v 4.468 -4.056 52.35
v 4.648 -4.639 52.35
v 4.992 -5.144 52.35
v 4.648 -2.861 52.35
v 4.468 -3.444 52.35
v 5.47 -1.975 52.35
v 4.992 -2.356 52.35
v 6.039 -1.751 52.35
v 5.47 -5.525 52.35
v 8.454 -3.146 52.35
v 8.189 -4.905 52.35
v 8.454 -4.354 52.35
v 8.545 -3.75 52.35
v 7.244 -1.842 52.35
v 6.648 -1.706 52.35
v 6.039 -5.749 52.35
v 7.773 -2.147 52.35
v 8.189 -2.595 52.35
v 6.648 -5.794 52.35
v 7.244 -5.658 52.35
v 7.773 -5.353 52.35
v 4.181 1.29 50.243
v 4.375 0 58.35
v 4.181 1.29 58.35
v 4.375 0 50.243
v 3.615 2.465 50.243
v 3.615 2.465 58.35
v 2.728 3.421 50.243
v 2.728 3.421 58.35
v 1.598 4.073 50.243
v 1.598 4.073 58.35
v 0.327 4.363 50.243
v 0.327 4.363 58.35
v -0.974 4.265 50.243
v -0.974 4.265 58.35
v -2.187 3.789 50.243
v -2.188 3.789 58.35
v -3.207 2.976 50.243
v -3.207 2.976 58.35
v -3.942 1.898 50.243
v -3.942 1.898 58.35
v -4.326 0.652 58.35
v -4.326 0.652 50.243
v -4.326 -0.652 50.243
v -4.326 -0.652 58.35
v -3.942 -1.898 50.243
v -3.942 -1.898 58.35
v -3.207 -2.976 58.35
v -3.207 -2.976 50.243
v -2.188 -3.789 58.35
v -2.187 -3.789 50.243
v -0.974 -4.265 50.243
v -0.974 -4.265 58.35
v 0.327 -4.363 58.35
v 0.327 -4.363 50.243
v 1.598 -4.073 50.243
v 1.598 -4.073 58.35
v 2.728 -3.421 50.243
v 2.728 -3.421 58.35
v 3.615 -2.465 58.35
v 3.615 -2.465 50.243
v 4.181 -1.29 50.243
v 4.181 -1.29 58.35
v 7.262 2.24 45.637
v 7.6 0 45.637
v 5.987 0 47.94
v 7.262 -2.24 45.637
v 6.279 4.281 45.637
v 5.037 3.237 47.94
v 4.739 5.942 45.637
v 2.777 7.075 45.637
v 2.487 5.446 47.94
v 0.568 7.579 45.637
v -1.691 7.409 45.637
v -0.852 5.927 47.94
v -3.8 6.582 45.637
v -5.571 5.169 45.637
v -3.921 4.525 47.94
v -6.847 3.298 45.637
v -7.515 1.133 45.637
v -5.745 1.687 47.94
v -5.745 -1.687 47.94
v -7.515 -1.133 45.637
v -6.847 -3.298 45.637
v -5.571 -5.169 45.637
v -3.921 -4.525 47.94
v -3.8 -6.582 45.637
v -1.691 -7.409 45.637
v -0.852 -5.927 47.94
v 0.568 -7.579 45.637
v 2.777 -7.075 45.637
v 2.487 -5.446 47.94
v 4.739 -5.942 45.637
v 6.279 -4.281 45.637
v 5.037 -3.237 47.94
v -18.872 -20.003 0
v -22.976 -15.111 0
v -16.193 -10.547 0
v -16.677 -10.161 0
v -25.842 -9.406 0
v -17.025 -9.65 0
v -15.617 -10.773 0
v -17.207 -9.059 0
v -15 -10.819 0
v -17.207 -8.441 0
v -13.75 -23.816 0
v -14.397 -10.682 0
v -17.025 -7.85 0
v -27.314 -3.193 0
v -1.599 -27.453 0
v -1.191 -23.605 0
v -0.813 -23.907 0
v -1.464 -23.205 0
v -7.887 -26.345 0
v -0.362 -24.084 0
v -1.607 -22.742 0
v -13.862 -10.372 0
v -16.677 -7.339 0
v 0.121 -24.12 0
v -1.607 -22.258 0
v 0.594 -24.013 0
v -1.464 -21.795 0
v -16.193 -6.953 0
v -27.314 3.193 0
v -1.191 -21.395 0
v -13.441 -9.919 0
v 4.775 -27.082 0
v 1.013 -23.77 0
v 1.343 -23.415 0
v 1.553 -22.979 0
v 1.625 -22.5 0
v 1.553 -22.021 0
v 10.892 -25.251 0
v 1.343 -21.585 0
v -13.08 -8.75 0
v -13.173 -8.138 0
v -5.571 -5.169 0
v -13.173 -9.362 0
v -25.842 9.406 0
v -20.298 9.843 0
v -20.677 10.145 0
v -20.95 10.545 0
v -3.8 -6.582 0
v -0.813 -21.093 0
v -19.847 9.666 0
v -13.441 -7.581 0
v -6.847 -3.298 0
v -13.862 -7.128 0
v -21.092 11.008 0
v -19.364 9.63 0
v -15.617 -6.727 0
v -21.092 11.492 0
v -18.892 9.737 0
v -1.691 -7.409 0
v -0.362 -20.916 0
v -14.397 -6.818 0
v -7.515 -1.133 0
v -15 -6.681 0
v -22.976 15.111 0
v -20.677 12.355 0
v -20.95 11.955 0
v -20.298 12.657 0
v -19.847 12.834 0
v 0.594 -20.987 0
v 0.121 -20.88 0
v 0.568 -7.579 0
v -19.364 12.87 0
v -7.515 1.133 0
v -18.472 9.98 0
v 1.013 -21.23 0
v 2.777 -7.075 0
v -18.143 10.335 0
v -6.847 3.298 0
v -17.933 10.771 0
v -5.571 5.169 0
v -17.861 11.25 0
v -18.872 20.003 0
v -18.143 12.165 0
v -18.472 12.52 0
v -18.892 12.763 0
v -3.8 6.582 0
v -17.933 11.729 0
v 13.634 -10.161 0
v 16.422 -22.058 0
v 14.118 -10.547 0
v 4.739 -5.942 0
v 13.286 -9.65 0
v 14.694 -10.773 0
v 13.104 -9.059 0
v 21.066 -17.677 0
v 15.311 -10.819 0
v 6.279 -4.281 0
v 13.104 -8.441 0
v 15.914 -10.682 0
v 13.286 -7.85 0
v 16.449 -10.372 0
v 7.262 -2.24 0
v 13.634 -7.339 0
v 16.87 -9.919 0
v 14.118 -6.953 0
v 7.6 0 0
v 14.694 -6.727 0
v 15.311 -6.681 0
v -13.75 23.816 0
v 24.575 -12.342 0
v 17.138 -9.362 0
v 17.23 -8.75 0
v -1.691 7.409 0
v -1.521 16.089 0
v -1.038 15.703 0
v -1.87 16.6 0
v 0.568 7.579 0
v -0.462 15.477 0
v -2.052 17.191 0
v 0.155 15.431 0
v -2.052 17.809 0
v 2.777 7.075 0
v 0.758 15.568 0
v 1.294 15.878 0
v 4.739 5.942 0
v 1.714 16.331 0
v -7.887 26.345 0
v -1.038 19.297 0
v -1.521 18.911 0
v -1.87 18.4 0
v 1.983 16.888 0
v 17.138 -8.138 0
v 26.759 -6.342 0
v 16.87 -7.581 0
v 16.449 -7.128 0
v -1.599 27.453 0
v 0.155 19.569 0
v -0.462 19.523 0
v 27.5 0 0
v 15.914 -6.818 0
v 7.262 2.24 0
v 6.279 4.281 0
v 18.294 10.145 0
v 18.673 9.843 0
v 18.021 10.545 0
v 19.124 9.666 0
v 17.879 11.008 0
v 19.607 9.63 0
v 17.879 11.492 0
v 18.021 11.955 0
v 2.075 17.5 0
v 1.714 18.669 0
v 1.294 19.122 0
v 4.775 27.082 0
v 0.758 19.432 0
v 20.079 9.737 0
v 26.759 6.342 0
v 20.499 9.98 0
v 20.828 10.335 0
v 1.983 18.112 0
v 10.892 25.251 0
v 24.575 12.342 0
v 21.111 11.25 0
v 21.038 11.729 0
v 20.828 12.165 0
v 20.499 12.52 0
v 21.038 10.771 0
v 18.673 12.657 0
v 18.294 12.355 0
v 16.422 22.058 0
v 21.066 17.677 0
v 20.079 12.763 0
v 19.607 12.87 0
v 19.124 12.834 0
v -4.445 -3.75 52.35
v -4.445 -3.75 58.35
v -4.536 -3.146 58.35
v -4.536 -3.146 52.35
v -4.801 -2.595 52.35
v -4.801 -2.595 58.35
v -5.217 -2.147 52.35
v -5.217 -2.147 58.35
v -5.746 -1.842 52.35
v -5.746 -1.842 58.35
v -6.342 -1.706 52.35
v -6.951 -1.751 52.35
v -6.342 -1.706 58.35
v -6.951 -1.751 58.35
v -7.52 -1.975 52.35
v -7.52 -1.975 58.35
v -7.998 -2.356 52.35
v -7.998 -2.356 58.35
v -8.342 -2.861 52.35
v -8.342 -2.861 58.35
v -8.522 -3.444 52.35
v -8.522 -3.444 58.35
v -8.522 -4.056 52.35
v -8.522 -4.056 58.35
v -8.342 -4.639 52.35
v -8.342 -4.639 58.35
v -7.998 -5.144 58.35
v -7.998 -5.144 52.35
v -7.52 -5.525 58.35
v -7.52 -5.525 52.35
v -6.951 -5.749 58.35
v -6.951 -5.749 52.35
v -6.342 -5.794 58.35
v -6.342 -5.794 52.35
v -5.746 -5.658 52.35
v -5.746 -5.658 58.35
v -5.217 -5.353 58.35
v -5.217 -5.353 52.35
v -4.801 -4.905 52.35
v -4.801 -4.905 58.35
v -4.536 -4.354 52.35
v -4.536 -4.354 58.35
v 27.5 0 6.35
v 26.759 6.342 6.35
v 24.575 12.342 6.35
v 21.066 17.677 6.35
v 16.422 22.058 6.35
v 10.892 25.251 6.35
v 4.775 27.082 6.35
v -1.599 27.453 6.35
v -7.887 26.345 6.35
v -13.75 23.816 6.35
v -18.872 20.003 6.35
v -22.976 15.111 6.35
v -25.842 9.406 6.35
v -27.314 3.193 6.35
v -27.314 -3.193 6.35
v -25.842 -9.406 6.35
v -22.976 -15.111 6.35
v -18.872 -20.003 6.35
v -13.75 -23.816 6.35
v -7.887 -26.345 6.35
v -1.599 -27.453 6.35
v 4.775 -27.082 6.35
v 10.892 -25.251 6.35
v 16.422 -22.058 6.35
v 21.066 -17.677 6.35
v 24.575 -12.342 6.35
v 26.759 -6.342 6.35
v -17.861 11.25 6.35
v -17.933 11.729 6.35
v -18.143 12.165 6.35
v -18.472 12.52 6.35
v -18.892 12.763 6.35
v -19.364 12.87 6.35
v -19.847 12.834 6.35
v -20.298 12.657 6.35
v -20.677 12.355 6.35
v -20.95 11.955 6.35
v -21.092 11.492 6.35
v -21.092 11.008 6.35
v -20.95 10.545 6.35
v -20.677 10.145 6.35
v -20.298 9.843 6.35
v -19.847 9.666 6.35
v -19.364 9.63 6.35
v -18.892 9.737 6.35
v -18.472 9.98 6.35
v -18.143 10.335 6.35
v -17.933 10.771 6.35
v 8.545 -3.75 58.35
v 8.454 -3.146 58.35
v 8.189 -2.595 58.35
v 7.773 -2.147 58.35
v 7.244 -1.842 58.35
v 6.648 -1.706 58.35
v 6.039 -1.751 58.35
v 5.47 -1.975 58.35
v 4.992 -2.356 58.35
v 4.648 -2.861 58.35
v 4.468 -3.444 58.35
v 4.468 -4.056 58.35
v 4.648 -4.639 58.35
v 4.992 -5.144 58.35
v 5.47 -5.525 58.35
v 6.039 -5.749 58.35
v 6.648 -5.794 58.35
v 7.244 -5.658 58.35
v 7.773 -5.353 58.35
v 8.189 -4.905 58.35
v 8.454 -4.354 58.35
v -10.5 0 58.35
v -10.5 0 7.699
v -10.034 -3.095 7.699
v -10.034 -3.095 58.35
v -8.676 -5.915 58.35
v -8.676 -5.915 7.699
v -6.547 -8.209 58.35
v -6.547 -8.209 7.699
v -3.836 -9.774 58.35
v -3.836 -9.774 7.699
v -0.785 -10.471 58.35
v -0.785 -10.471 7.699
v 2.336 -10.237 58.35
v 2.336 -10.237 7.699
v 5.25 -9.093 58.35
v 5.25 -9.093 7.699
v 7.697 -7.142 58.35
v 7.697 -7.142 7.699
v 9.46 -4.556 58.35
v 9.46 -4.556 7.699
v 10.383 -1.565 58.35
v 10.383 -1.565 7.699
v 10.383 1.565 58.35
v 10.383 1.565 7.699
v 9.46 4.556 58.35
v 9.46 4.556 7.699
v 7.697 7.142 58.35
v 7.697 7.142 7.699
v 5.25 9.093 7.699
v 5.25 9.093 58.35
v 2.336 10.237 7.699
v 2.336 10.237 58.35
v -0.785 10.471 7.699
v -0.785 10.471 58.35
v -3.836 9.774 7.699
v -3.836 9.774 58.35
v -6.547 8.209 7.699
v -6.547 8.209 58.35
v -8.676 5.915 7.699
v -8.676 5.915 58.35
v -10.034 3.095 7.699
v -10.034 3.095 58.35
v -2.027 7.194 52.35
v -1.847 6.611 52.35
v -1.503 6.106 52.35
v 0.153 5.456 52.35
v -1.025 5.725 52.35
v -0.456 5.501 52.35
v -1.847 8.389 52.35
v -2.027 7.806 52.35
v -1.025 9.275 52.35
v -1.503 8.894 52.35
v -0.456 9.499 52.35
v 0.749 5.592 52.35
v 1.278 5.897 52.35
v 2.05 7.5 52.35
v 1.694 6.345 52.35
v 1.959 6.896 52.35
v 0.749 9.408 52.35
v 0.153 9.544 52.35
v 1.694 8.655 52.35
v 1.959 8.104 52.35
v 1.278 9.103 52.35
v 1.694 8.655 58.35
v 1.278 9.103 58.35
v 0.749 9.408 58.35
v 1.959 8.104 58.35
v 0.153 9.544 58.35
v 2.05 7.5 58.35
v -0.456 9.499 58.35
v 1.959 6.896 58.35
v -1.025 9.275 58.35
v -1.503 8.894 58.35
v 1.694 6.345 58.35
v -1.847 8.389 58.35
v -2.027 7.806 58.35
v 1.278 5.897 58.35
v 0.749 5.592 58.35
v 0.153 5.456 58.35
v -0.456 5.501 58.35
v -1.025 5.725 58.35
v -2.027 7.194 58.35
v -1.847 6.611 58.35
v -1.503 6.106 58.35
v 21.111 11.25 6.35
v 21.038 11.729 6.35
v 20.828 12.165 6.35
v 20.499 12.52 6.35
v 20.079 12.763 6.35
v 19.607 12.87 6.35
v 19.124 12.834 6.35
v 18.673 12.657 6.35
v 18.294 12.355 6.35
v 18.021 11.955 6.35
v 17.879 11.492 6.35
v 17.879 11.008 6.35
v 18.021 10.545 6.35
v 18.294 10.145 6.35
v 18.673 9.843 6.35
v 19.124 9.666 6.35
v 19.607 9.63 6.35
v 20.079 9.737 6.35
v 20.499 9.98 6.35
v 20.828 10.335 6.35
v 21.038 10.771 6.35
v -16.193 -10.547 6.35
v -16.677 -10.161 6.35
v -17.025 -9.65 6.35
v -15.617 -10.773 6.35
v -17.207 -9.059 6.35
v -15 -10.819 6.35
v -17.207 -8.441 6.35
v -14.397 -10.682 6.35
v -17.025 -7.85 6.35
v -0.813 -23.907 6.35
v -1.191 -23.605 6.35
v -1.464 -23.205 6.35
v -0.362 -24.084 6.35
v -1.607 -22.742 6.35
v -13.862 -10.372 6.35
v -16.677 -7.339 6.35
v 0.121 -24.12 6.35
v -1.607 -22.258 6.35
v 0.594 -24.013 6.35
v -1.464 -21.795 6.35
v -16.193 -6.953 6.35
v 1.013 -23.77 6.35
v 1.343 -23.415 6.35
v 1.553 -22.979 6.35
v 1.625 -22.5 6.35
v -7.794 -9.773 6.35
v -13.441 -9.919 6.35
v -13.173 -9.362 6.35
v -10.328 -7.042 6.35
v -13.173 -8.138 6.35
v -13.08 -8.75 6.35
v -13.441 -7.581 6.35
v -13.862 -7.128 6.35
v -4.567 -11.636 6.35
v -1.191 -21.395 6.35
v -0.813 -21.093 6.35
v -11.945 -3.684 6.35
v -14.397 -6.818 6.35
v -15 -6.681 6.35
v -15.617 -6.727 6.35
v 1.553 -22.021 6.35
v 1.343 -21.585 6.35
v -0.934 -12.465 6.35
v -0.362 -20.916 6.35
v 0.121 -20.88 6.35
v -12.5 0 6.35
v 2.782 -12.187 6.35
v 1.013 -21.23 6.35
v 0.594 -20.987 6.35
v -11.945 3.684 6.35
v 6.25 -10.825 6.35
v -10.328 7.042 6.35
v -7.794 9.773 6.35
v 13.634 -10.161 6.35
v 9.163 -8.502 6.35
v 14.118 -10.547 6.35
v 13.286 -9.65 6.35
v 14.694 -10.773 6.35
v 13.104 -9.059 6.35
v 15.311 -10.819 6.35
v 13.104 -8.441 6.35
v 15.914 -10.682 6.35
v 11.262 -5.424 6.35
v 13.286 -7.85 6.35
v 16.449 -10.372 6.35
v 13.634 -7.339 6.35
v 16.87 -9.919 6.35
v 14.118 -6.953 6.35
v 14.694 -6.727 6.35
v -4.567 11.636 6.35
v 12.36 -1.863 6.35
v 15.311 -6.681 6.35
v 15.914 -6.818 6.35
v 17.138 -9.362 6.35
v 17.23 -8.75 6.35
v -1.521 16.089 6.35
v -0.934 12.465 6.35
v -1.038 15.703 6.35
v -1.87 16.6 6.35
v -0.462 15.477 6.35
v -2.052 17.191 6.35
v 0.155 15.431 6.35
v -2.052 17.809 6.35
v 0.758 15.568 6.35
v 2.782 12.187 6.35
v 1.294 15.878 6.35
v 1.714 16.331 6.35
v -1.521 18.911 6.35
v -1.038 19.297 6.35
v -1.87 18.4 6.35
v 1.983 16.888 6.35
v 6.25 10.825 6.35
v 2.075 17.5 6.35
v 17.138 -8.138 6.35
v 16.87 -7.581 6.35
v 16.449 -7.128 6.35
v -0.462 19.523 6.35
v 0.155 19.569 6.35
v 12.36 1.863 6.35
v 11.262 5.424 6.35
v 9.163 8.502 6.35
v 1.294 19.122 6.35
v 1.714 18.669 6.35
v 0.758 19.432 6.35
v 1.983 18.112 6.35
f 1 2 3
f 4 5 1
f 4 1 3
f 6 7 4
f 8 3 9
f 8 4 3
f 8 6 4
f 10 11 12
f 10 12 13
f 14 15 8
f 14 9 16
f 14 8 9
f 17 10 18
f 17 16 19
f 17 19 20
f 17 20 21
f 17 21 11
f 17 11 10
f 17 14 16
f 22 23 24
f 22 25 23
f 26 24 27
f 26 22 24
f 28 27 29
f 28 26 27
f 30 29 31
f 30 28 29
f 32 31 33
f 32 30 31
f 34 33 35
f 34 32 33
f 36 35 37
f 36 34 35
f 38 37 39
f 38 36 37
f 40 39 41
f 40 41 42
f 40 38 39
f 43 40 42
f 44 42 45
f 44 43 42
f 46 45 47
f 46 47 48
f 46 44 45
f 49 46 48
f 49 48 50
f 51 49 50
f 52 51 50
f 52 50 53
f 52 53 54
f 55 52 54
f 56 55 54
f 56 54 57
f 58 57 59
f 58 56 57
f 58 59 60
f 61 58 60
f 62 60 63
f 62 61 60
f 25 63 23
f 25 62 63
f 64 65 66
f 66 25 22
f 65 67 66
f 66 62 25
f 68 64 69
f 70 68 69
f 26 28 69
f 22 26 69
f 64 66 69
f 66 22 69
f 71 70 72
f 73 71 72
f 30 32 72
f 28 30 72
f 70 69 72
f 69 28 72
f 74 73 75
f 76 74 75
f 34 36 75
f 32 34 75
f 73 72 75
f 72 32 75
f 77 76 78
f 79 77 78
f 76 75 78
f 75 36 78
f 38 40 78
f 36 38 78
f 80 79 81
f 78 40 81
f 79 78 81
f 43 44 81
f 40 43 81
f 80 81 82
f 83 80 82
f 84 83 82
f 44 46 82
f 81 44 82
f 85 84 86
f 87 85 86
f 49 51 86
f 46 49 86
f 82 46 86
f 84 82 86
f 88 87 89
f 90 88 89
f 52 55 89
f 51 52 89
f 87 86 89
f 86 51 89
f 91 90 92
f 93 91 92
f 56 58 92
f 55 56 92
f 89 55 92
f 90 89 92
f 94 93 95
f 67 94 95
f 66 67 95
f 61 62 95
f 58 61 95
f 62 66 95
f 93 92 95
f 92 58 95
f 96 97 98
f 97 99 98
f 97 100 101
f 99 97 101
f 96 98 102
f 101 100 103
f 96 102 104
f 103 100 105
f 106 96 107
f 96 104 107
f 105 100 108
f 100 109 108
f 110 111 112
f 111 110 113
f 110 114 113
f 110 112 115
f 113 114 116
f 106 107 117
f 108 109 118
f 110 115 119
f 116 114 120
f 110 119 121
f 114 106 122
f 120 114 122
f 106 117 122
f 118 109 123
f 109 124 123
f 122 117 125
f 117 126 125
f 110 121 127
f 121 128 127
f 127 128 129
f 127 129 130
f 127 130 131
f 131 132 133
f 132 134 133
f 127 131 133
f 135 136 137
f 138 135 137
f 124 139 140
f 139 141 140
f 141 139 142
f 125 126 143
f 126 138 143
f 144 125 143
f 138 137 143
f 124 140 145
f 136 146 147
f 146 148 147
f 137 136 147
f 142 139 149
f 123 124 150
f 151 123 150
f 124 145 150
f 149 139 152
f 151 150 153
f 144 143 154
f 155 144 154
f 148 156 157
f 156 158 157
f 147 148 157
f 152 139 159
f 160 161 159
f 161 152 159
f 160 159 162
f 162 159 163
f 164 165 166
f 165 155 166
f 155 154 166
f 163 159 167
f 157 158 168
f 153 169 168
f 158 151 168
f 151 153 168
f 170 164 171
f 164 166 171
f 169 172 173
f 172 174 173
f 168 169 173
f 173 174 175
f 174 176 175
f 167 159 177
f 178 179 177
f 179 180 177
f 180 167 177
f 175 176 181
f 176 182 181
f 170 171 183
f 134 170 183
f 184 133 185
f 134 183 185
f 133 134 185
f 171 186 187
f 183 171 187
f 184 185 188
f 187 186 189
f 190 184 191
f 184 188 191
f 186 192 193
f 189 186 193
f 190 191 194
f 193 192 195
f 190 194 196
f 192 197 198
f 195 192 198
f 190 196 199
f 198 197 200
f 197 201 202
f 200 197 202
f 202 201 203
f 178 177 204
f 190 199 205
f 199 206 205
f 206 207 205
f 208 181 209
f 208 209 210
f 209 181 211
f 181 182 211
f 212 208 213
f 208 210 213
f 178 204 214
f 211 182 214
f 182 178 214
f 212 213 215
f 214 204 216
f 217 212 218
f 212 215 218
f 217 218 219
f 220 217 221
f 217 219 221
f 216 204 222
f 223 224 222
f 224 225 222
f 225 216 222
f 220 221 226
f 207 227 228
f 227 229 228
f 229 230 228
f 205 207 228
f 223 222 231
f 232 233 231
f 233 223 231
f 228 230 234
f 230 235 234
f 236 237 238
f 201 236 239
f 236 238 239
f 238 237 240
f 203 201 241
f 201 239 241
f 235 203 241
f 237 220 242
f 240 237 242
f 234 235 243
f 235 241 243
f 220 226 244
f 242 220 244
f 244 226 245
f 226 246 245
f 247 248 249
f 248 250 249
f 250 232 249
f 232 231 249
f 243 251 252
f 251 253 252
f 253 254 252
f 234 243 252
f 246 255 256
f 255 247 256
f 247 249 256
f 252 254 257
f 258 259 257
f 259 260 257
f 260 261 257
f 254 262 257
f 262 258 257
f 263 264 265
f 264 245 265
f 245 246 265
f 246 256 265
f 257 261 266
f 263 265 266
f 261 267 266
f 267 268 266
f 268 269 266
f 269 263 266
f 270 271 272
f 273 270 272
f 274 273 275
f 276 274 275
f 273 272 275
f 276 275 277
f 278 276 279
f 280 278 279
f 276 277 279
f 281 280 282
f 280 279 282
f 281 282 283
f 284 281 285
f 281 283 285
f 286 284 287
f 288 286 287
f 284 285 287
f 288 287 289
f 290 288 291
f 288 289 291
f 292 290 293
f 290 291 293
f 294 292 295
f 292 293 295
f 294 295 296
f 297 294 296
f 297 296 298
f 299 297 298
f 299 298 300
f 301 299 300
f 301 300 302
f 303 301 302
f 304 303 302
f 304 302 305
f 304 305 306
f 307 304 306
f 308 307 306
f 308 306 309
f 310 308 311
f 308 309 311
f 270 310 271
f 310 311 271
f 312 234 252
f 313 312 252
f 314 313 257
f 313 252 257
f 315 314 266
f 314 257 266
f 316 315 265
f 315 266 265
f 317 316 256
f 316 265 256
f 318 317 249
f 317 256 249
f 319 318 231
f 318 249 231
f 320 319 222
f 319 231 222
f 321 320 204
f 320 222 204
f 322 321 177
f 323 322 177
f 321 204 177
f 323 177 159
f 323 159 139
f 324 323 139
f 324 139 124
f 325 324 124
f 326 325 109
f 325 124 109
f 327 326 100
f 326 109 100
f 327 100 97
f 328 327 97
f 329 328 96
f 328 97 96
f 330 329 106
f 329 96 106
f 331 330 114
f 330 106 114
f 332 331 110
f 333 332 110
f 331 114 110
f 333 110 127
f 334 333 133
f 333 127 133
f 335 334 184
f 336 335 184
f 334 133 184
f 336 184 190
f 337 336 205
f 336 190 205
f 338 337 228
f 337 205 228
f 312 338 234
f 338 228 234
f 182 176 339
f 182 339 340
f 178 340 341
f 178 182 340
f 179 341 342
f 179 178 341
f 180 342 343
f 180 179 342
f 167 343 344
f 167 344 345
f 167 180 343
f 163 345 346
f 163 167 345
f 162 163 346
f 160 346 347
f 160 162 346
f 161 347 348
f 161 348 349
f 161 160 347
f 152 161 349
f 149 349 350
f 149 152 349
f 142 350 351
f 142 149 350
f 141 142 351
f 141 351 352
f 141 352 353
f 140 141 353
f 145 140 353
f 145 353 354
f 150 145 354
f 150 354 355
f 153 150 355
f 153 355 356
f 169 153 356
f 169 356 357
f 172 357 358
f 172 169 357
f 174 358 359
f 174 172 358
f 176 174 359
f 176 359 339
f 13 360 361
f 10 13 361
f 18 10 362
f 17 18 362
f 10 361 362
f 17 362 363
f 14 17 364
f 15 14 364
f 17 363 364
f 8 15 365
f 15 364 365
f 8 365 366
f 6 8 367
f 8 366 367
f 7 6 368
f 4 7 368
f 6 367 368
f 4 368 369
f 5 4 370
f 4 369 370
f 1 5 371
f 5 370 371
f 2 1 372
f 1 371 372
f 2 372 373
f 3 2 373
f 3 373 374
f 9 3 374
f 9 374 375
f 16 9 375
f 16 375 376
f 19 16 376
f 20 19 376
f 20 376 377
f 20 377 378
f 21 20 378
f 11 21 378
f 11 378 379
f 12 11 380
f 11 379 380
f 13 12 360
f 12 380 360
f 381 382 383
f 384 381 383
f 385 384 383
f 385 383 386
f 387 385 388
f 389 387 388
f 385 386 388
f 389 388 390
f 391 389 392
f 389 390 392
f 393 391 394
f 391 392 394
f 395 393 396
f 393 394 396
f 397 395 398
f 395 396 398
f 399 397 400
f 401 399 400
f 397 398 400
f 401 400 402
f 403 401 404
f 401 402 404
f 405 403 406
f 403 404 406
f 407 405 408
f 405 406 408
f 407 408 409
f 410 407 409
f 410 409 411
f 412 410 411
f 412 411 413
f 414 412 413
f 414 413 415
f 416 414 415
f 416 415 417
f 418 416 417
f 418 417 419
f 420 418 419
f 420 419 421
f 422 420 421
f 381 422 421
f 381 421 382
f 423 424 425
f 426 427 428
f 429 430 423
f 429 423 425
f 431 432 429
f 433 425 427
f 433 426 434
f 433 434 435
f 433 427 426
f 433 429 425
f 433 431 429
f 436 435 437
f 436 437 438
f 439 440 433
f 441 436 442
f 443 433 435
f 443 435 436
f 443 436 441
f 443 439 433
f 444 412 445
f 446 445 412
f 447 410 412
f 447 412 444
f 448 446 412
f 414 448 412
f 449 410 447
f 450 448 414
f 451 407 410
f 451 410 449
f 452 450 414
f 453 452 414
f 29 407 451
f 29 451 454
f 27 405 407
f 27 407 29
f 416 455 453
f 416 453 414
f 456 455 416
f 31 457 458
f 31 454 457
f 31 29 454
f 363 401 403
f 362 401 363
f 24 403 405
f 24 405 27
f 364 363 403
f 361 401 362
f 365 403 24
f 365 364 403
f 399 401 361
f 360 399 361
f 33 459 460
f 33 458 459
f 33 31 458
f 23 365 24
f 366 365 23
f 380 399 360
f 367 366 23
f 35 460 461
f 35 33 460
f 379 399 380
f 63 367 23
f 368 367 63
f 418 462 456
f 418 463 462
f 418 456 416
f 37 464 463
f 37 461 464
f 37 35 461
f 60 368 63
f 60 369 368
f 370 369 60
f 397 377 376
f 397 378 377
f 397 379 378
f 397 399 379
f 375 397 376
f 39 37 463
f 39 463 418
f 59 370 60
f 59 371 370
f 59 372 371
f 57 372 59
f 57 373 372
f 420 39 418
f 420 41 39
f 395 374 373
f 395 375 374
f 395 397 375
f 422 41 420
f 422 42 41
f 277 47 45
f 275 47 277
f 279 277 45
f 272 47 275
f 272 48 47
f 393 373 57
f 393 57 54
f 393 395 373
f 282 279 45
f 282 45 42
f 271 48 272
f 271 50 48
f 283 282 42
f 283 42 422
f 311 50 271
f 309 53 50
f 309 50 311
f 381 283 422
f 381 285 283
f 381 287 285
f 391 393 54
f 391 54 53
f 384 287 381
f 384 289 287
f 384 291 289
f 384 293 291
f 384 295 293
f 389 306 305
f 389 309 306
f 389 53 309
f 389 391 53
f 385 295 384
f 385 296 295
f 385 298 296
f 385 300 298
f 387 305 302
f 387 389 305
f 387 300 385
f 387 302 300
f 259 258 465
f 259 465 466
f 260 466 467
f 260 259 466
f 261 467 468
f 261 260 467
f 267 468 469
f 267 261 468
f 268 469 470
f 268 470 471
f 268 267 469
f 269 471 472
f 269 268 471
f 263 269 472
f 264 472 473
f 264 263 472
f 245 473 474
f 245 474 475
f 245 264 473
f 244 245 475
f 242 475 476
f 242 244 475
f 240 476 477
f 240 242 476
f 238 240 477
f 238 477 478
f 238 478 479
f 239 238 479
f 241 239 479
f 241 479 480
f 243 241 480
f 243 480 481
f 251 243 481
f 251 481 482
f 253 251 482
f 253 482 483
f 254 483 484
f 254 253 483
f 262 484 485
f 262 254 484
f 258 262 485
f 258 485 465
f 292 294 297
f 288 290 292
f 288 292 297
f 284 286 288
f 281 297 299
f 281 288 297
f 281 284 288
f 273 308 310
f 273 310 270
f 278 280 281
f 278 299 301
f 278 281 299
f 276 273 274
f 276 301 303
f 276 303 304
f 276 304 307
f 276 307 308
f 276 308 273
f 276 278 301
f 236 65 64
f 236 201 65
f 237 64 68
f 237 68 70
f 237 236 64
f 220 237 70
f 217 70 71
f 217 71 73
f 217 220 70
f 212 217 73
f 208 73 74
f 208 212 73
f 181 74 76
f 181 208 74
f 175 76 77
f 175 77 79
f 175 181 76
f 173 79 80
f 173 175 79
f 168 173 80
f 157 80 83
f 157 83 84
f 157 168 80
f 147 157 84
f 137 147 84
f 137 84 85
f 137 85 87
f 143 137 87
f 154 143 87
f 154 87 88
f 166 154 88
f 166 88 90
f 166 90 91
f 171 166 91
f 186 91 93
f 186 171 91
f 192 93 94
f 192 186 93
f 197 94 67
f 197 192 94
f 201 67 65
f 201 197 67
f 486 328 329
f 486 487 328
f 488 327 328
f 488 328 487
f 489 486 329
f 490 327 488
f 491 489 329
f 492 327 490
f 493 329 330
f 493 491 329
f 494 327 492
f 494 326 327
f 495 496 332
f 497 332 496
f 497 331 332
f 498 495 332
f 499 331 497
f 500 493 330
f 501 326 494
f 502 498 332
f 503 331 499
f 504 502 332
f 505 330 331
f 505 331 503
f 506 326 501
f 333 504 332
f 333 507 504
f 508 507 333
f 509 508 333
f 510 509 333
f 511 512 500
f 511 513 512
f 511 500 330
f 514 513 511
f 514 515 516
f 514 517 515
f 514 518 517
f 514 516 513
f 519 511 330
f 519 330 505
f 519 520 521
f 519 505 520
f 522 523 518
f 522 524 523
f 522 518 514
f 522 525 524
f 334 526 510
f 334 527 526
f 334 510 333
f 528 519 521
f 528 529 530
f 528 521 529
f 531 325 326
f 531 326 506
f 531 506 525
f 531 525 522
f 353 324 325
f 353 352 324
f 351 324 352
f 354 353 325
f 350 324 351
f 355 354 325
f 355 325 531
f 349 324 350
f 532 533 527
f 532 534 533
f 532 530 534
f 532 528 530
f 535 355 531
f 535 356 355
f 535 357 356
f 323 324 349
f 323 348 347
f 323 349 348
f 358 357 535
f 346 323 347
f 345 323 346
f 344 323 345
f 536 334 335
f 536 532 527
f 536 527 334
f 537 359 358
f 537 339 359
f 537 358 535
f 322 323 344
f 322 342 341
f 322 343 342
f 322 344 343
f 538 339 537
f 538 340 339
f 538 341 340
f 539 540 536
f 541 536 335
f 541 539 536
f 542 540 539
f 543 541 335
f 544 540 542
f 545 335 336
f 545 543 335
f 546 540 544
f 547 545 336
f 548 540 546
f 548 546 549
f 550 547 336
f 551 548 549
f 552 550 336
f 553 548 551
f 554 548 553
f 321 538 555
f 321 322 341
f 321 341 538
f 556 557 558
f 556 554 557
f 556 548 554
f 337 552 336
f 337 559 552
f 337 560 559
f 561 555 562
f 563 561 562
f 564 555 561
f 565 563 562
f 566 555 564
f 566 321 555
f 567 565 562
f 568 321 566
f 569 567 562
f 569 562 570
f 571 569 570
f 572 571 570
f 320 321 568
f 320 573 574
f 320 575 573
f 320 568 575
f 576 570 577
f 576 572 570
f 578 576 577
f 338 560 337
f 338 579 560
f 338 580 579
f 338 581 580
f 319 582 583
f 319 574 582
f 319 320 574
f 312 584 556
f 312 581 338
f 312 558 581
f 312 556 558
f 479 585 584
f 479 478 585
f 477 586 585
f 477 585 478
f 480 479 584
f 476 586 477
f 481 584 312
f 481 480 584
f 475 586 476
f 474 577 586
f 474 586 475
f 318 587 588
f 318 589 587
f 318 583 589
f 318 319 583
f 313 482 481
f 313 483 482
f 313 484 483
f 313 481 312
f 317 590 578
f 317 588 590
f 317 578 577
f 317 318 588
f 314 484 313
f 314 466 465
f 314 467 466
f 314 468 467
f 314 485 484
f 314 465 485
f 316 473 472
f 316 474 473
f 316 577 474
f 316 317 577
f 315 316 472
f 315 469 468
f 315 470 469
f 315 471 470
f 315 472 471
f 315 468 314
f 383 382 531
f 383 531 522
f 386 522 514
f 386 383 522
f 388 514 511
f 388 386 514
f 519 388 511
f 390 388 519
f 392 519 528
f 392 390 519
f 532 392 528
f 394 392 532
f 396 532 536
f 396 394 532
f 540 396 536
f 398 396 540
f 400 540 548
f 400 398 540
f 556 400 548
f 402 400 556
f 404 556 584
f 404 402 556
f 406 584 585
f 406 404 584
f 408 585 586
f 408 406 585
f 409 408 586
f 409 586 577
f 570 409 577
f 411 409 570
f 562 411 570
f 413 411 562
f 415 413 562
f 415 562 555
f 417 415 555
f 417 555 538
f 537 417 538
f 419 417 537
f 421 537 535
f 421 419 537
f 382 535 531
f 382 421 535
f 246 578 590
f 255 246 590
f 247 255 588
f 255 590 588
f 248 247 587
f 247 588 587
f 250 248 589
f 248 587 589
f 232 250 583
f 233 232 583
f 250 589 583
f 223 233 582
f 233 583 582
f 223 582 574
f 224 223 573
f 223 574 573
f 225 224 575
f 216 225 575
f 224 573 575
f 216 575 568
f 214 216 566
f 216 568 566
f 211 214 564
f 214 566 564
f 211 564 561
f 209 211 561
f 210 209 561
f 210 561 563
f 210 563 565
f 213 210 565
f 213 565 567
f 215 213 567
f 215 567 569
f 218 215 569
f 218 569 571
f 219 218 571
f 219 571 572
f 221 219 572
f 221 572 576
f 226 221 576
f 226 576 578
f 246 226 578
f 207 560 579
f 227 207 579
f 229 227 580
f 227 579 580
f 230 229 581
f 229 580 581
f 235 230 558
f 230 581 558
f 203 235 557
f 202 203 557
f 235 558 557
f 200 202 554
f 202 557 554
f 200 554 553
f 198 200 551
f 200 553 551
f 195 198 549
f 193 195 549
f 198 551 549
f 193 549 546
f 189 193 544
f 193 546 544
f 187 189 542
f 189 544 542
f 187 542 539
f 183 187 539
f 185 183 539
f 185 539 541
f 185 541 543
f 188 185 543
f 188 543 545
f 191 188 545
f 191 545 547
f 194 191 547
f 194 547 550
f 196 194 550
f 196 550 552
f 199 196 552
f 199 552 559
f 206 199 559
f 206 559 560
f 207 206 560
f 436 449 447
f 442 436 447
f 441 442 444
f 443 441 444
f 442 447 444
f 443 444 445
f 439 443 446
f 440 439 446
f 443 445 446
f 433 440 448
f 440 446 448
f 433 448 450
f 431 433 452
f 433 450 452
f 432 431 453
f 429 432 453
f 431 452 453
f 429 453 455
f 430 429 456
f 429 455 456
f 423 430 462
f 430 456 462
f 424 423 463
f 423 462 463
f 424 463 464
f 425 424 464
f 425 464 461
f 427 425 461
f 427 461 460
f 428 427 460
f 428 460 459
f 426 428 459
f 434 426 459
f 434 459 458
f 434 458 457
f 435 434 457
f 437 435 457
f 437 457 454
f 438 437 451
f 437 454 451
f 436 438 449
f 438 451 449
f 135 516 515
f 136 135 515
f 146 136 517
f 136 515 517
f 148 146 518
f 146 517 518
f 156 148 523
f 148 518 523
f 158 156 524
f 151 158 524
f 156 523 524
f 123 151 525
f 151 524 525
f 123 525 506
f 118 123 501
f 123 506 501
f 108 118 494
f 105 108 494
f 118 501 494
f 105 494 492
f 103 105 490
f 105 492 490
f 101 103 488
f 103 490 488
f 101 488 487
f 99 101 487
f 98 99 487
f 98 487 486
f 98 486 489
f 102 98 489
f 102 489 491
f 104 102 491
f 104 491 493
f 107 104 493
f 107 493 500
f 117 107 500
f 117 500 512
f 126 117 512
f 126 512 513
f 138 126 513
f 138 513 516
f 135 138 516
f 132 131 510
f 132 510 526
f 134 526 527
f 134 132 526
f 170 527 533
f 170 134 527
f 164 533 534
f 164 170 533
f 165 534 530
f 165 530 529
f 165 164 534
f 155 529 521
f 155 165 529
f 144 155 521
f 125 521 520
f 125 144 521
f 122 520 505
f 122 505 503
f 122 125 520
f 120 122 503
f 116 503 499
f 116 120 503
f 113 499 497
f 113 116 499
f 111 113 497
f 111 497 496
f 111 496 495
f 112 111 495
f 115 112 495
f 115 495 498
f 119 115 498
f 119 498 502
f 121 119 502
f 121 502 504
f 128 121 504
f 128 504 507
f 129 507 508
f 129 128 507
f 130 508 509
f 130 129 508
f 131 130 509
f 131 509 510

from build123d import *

# Parameters (mm, degrees)
ESQUISSE3_R         = 27.5
ESQUISSE3_R_2       = 1.625
ESQUISSE3_R_3       = 7.6
BOSS_EXTRU_1_DEPTH  = 6.35
ESQUISSE4_R         = 10.5
ESQUISSE4_R_2       = 7.6
BOSS_EXTRU_2_DEPTH  = 45
SKETCH1_R           = 10.5
SKETCH1_R_2         = 4.375
BOSS_EXTRUDE1_DEPTH = 7
SKETCH2_R           = 2.05
CUT_EXTRUDE1_DEPTH  = 6
CHAMFER2_SIZE       = 5.712592027
CHAMFER2_SIZE_2     = 4
CHAMFER3_SIZE       = 2
CHAMFER3_SIZE2      = 1.349017034
SKETCH3_R           = 2.075
CUT_EXTRUDE2_DEPTH  = 8


with BuildPart() as part:
    # Esquisse3 → Boss.-Extru.1 (new body)
    with BuildSketch(Plane.XY):
        Circle(ESQUISSE3_R)
        with Locations((-19.485571585, 11.25)):
            Circle(ESQUISSE3_R_2, mode=Mode.SUBTRACT)
        with Locations((19.485571585, 11.25)):
            Circle(ESQUISSE3_R_2, mode=Mode.SUBTRACT)
        with Locations((0, -22.5)):
            Circle(ESQUISSE3_R_2, mode=Mode.SUBTRACT)
        Circle(ESQUISSE3_R_3, mode=Mode.SUBTRACT)
    extrude(amount=BOSS_EXTRU_1_DEPTH)

    # Esquisse4 → Boss.-Extru.2 (add)
    with BuildSketch(Plane.XY.offset(6.35)):
        with Locations(Location((0, 0, 0), (0, 0, 180))):
            Circle(ESQUISSE4_R)
        Circle(ESQUISSE4_R_2, mode=Mode.SUBTRACT)
    extrude(amount=BOSS_EXTRU_2_DEPTH)

    # Sketch1 → Boss-Extrude1 (add)
    with BuildSketch(Plane.XY.offset(51.35)):
        with Locations(Location((0, 0, 0), (0, 0, 180))):
            Circle(SKETCH1_R)
        Circle(SKETCH1_R_2, mode=Mode.SUBTRACT)
    extrude(amount=BOSS_EXTRUDE1_DEPTH)

    # Sketch2 → Cut-Extrude1 (cut)
    with BuildSketch(Plane.XY.offset(58.35)):
        with Locations((0, 7.5)):
            Circle(SKETCH2_R)
        with Locations((-6.495190528, -3.75)):
            Circle(SKETCH2_R)
        with Locations((6.495190528, -3.75)):
            Circle(SKETCH2_R)
    extrude(amount=-CUT_EXTRUDE1_DEPTH, mode=Mode.SUBTRACT)

    # Chamfer2
    # the kernel refuses this chamfer: 5.712592027, 4 mm, written as the material it adds along each edge
    with BuildSketch(Plane(origin=(0, 0, 51.35), x_dir=(1, 0, 0), z_dir=(0, -1, 0))) as chamfer2_piece_1_section:
        Polygon((7.6, -CHAMFER2_SIZE), (7.6 - CHAMFER2_SIZE_2, 0), (7.6, 0), align=None)
    chamfer2_piece_1 = revolve(axis=Axis((0, 0, 51.35), (0, 0, 1)), mode=Mode.PRIVATE)
    chamfer2_piece_1 = chamfer2_piece_1 - Plane(origin=(0, 0, 47.891956694), x_dir=(1, 0, 0), z_dir=(0, 0, -1)) * Cylinder(4.375, 31, mode=Mode.PRIVATE)
    add(chamfer2_piece_1)

    # Chamfer3
    chamfer3_edges = [part.edges().sort_by_distance(p)[0] for p in [
        (10.5, 0, 6.35),
    ]]
    chamfer3_side = [part.faces().sort_by_distance(p)[0] for p in [
        (-26.722182541, 0, 6.35),
    ]]
    chamfer(chamfer3_edges, length=CHAMFER3_SIZE, length2=CHAMFER3_SIZE2, reference=chamfer3_side[0])

    # Sketch3 → Cut-Extrude2 (cut)
    with BuildSketch(Plane.XY.offset(6.35)):
        with Locations((0, 17.5)):
            Circle(SKETCH3_R)
        with Locations((-15.155444566, -8.75)):
            Circle(SKETCH3_R)
        with Locations((15.155444566, -8.75)):
            Circle(SKETCH3_R)
    extrude(amount=-CUT_EXTRUDE2_DEPTH, mode=Mode.SUBTRACT)


solid = part.part
